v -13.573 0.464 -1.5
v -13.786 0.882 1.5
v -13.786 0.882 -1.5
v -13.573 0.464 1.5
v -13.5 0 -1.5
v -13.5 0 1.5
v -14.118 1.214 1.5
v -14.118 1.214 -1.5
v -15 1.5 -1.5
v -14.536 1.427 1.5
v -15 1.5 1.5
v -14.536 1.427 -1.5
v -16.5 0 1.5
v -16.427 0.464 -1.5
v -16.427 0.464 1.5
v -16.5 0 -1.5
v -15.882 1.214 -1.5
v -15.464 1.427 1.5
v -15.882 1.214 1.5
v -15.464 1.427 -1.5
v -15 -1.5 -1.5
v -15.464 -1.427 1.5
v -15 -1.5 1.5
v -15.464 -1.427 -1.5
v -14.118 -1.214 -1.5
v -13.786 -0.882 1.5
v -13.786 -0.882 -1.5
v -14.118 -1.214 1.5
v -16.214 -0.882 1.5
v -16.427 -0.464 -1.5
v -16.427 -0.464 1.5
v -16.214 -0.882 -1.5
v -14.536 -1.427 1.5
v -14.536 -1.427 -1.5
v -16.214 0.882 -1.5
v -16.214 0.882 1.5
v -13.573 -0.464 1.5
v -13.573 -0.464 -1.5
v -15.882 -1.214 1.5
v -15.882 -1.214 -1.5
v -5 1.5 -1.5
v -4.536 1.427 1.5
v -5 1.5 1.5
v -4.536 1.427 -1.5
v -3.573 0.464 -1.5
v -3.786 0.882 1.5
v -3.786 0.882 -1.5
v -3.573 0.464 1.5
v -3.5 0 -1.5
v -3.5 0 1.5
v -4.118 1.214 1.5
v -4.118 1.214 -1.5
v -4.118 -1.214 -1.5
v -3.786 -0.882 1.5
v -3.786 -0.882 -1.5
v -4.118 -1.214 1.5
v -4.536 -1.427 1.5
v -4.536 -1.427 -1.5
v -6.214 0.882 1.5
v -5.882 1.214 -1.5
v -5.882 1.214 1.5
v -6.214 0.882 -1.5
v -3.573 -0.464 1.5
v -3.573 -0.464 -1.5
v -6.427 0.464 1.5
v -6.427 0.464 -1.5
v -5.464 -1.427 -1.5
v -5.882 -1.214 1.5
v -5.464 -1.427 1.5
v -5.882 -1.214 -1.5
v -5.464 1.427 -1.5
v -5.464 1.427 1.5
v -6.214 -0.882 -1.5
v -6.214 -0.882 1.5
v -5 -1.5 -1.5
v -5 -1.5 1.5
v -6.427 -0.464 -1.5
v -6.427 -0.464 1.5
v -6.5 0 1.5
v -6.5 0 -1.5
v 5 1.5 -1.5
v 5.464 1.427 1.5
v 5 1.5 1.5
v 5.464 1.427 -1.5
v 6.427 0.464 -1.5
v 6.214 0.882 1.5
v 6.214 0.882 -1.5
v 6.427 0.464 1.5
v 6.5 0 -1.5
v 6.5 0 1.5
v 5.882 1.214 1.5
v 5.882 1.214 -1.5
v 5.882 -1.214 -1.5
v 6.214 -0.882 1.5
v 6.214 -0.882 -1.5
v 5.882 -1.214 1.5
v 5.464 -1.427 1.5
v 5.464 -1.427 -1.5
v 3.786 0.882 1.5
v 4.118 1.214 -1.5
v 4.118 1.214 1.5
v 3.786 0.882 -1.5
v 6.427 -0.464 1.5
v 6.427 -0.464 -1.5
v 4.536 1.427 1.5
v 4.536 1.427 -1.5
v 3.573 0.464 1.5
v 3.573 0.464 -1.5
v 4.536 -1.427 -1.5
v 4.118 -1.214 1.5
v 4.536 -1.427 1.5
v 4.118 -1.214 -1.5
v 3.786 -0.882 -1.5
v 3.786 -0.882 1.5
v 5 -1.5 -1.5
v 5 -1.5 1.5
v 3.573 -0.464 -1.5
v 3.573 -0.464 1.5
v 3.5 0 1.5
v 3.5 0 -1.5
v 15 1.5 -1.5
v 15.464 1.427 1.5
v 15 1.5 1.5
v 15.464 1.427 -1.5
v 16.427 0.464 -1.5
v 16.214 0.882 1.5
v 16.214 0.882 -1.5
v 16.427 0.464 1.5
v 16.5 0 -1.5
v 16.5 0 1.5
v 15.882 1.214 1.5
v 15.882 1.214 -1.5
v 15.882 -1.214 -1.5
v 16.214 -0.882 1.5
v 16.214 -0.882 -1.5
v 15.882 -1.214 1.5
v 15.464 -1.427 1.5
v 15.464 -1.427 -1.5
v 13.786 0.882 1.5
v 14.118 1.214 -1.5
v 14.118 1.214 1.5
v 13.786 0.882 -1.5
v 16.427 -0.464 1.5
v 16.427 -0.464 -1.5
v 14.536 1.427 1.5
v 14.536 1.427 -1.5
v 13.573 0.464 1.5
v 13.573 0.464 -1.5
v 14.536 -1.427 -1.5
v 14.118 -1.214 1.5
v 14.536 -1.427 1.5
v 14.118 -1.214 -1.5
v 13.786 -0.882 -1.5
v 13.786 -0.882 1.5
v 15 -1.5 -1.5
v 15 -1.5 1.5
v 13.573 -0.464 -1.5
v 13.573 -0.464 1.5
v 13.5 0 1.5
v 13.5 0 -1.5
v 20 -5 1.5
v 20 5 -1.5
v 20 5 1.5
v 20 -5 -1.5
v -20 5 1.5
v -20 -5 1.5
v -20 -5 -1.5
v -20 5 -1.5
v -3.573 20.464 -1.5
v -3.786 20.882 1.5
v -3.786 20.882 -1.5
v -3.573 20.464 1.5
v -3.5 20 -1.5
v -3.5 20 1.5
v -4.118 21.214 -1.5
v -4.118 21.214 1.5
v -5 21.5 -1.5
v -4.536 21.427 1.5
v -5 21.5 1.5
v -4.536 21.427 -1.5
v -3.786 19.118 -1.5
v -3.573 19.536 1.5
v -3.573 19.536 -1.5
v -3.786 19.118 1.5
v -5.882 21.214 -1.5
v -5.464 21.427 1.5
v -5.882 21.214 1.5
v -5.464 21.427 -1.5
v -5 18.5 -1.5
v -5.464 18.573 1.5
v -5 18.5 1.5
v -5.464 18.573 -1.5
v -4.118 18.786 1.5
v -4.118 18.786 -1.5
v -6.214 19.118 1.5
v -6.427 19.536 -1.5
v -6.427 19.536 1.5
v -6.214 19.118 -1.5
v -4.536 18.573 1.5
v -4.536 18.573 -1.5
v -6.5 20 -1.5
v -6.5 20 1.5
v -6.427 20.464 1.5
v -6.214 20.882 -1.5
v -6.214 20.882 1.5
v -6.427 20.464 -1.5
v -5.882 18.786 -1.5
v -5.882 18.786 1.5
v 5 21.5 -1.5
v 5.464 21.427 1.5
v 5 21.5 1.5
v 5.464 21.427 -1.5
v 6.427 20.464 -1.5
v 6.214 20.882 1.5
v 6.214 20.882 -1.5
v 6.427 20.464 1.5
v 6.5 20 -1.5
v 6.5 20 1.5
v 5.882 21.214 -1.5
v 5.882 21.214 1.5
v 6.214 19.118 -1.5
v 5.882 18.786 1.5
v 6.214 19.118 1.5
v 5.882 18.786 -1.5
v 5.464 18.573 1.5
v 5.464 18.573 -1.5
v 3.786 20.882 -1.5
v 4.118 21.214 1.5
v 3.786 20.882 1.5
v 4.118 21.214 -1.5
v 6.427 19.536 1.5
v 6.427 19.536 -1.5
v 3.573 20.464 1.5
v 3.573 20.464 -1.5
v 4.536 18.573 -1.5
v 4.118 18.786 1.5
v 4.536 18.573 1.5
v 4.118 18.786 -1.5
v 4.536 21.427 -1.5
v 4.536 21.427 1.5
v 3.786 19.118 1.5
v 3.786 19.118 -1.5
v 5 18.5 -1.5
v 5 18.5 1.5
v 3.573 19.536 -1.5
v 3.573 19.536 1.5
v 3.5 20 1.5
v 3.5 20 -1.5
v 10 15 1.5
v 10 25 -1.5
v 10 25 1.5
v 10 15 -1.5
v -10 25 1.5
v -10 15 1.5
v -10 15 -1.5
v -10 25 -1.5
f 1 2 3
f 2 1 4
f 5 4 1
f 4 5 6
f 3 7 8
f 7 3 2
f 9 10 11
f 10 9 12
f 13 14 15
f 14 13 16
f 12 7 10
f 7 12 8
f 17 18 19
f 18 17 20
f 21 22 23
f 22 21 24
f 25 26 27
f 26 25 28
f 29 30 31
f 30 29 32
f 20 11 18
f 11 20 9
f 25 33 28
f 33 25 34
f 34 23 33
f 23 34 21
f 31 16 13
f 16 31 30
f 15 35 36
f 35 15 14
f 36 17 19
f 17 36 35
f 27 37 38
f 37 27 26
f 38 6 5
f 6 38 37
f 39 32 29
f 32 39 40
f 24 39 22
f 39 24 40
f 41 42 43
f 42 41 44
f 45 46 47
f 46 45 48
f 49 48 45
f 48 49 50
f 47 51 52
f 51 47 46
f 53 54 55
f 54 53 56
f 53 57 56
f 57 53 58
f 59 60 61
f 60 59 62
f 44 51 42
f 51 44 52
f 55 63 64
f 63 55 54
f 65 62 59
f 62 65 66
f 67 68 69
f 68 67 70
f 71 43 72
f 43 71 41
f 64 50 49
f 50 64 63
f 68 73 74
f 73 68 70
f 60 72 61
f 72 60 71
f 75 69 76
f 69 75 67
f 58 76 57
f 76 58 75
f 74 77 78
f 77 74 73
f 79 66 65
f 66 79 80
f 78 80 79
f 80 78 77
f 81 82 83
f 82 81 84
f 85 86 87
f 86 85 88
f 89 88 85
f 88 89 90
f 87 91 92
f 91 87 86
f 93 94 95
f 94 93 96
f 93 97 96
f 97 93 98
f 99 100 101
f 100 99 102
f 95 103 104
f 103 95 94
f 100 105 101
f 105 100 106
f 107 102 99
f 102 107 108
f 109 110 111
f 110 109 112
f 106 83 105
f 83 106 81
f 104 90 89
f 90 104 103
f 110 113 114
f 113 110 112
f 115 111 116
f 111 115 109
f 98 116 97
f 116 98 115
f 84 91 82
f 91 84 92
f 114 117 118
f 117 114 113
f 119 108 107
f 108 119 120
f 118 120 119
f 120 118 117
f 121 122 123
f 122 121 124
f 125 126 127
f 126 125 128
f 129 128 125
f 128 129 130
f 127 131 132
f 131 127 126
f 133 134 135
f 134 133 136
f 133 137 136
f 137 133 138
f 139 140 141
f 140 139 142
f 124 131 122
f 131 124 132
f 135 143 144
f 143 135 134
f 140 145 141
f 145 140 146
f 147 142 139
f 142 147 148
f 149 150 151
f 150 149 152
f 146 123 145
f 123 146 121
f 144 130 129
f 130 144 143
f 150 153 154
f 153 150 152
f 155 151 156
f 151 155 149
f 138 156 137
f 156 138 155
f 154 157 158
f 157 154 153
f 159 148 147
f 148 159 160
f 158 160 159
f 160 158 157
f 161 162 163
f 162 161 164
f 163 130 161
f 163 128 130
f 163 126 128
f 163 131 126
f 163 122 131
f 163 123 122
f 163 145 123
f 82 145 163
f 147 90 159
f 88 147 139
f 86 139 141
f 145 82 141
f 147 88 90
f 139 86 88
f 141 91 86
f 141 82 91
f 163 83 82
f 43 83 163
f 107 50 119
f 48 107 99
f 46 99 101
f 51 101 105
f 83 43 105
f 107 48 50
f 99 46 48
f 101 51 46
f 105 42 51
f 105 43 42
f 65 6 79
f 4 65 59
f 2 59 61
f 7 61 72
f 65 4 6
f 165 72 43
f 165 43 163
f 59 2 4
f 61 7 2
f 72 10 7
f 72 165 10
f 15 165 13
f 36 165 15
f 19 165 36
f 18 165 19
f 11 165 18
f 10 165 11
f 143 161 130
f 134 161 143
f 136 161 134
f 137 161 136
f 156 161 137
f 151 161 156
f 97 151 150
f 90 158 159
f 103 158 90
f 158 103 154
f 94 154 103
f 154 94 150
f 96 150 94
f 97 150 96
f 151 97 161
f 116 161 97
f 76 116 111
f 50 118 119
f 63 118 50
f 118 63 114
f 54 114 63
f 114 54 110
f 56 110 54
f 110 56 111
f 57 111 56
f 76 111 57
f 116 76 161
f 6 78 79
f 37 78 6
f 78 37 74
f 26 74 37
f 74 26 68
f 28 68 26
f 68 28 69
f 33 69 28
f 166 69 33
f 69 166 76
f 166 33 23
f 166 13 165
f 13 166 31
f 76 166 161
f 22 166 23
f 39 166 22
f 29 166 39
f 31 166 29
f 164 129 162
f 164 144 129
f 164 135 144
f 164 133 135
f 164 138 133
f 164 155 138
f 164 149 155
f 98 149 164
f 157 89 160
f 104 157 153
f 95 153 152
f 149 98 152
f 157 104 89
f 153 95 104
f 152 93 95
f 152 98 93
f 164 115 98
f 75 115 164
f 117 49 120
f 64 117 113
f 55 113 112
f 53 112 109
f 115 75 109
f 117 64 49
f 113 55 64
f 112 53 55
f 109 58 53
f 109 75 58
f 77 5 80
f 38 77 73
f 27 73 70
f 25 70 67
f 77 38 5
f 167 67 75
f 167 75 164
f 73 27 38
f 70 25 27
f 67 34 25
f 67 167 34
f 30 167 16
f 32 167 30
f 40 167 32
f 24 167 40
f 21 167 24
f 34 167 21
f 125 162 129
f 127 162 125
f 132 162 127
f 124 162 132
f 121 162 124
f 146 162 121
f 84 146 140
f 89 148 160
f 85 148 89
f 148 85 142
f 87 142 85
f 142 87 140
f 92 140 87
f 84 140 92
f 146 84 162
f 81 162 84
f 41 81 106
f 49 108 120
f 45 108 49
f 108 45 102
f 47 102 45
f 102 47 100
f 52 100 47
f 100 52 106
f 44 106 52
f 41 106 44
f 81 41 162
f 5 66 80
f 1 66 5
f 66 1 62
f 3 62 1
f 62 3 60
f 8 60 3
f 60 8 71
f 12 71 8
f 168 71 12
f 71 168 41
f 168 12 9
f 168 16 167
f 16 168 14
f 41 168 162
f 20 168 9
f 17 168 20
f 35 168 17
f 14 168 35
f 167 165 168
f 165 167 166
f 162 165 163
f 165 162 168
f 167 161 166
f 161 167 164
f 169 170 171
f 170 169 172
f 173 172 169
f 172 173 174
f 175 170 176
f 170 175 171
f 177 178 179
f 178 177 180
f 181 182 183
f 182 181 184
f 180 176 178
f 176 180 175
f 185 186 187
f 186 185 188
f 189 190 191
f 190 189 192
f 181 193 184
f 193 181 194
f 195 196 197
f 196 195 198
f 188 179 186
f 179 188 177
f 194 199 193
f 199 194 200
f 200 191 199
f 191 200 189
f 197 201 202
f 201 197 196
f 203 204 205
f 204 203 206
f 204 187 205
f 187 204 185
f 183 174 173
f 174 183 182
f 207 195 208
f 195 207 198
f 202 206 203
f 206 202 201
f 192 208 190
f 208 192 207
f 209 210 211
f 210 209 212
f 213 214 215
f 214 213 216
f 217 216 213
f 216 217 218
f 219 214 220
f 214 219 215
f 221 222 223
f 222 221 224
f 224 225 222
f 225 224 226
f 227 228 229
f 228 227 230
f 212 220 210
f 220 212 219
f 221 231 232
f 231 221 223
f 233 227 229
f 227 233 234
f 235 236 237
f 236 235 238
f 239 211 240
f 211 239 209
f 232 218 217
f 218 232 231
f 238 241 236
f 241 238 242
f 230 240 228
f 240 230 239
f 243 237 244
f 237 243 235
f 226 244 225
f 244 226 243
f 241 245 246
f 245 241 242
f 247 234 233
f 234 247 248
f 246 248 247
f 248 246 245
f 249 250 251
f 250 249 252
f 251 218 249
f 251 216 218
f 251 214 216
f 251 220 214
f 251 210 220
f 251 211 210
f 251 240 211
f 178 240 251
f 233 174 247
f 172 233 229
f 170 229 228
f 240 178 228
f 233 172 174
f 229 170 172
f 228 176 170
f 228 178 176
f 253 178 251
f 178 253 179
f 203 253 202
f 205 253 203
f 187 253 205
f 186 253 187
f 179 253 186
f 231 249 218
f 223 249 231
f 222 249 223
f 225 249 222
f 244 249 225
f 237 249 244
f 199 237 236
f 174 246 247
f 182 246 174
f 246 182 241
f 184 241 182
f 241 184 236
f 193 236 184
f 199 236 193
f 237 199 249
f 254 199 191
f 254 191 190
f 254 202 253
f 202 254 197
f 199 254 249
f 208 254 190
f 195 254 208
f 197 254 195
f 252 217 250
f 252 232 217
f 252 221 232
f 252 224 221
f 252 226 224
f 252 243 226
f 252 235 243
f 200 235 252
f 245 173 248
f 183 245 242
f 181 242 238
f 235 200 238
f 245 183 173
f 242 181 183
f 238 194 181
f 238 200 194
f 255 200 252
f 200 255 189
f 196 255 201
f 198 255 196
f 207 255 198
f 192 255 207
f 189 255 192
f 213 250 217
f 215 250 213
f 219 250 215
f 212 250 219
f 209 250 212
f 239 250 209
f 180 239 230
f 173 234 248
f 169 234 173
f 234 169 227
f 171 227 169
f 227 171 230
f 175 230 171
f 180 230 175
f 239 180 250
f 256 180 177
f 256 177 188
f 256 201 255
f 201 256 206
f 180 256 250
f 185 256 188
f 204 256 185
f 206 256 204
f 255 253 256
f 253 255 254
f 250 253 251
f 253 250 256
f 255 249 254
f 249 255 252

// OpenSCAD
module pieza_mecano(drill=3, d=10, n=4, anchura=10, grosor=3)
{

  //-- Calcular la longitud de la pieza
  lx = n*d;

  //-- Construimos la pieza
  difference() {
    //-- Cuerpo de la pieza
    cube([lx,anchura,grosor],center=true);

    //-- Taladros
    translate([-lx/2+d/2,0,0])
      for (i=[0:n-1]) {
        translate([i*d,0,0])
          cylinder(r=drill/2, h=grosor+5, $fn=20,center=true);
    }
  }
}

//-- Ejemplos de utilizacion
pieza_mecano();


translate([0,20,0])
  pieza_mecano(n=2);
